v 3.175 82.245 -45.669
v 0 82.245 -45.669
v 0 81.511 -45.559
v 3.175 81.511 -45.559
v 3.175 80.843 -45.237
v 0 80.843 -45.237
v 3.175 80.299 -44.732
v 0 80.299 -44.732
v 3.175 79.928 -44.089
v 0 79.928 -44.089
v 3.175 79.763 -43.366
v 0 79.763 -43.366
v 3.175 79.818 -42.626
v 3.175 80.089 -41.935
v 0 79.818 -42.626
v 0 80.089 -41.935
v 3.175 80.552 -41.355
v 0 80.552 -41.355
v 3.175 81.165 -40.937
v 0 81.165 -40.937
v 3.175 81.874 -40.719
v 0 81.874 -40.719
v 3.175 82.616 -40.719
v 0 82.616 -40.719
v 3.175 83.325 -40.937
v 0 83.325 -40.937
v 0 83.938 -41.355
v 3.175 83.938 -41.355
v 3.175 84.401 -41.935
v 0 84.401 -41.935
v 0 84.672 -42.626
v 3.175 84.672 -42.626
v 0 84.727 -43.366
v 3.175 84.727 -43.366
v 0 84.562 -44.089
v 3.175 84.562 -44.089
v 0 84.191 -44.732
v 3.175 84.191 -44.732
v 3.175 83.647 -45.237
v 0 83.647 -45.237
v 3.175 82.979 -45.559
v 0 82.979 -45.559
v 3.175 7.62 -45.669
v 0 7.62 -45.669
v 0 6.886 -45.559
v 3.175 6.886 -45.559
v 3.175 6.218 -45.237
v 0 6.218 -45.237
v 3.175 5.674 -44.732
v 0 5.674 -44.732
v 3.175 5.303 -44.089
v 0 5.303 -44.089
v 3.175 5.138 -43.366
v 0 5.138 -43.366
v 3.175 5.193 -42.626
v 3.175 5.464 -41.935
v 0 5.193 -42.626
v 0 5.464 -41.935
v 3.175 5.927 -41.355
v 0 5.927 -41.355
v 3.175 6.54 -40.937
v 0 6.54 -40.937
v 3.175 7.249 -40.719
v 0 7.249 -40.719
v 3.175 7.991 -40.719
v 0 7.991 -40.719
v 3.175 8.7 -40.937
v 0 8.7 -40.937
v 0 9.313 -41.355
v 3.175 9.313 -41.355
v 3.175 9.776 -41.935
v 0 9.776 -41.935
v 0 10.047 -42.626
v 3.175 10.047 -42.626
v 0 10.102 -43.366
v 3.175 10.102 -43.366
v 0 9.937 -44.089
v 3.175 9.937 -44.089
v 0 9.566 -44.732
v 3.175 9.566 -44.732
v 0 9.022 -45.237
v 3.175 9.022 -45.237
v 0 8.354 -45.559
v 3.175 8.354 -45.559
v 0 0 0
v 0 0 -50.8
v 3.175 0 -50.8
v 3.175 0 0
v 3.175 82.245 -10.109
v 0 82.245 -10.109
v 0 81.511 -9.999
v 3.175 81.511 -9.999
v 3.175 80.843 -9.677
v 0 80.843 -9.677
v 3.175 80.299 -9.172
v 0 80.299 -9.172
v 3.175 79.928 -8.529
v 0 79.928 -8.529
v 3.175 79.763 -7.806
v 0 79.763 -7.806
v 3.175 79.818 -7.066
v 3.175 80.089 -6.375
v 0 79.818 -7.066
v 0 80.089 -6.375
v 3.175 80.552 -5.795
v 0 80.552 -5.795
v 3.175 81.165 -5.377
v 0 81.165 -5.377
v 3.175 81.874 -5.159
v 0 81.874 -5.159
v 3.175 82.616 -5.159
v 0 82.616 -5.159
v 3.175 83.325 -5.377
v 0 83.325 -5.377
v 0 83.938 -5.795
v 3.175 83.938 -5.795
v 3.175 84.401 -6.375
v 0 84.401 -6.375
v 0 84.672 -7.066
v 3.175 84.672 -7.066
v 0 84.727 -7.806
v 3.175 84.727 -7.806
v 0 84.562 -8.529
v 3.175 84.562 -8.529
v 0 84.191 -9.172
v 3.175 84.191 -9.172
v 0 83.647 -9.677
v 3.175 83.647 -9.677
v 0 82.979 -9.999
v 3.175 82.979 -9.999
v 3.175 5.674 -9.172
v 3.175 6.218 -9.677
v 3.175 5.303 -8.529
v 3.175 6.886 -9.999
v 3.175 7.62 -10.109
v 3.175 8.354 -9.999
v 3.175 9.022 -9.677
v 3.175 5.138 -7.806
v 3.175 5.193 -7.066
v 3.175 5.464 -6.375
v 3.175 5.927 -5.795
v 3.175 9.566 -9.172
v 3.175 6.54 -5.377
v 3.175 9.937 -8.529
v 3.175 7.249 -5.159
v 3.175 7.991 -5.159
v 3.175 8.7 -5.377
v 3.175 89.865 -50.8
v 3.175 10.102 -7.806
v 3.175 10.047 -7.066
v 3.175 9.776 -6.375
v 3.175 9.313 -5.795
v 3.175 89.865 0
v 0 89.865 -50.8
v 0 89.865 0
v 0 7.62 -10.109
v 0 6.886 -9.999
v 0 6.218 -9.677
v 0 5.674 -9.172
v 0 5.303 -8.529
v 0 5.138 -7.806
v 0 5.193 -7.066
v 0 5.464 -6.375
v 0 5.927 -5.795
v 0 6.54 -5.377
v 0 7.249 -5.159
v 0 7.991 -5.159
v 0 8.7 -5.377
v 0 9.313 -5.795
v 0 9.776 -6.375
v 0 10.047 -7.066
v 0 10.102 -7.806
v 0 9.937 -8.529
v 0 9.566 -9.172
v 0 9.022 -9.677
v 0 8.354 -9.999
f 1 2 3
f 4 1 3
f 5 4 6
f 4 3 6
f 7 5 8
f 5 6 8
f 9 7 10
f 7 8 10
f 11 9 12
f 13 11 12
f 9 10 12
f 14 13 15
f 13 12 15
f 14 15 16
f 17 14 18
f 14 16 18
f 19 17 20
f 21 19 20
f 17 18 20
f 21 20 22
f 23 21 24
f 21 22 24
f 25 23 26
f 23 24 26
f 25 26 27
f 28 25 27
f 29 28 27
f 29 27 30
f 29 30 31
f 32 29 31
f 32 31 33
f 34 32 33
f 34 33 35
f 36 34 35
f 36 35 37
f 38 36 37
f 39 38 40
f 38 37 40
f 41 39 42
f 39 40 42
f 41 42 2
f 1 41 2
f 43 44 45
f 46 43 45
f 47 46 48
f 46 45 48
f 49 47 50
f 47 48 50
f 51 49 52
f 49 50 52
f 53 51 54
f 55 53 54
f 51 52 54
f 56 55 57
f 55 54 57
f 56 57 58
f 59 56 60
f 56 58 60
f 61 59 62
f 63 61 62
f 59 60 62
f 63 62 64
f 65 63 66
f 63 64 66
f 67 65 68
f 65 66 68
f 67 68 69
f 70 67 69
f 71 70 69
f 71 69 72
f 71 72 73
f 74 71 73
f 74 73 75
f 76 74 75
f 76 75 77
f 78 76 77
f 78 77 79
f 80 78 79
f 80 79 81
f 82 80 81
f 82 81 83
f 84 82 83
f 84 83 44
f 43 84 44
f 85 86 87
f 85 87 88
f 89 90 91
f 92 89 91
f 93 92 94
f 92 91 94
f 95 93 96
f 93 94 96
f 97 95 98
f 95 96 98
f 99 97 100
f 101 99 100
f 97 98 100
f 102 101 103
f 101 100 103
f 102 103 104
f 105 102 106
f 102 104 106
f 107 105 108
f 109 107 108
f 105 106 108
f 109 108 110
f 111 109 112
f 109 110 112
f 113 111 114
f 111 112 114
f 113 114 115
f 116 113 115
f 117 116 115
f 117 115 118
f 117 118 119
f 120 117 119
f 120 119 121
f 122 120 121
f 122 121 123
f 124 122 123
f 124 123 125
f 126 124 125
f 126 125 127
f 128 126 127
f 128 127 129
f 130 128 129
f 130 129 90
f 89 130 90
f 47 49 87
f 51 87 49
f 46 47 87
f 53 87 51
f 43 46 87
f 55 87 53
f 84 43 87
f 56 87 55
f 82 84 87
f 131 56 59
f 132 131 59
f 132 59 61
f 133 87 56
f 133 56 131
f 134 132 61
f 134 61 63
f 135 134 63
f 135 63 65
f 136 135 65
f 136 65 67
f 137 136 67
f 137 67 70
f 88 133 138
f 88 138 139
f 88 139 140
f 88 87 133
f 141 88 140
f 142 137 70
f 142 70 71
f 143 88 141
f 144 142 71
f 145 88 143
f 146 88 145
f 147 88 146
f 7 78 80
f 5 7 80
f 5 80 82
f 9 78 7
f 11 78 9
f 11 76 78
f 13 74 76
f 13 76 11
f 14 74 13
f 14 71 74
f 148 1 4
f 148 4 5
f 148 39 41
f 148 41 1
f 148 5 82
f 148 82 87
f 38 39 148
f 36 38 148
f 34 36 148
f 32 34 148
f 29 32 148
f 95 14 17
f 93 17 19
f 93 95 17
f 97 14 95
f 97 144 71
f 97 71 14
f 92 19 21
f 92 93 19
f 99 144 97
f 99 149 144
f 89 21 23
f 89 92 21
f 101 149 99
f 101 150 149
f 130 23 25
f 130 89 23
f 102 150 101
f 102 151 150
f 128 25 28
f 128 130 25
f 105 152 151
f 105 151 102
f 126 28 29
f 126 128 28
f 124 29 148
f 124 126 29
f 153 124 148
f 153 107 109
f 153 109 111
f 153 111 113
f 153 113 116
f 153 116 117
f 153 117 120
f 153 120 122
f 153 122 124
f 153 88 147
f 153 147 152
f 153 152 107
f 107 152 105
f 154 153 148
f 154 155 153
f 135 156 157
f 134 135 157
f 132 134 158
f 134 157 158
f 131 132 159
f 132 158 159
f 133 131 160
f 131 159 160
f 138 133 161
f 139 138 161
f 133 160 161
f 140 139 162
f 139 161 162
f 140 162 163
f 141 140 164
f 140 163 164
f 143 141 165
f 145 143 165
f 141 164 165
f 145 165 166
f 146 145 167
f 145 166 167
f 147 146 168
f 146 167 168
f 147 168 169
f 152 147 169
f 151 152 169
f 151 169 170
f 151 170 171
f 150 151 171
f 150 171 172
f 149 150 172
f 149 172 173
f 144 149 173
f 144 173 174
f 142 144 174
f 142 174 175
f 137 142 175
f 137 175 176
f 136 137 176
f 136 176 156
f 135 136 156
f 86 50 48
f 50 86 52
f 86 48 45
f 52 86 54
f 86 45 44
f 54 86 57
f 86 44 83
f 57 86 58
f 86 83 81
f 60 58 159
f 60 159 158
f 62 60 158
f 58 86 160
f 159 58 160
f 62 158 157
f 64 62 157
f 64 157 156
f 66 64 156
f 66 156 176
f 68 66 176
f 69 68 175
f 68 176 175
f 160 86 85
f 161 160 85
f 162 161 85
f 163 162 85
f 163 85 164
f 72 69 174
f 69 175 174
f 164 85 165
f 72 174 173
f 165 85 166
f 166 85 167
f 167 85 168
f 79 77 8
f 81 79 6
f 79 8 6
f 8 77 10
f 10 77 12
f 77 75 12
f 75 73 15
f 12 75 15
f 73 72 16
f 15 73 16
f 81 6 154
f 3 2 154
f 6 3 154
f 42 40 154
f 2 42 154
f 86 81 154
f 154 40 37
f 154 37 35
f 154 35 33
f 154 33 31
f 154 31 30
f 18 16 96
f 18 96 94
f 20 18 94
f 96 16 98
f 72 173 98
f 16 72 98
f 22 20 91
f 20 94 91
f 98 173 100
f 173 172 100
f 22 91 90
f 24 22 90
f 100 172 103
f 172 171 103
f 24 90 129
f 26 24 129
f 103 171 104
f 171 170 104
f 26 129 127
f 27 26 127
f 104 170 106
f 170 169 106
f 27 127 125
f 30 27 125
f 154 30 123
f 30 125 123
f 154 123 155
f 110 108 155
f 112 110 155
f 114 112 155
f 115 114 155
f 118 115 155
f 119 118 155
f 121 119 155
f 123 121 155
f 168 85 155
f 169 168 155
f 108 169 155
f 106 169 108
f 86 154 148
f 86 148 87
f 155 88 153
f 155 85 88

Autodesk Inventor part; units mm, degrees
ref_plane "YZ Plane" through (0, 0, 0) normal (1, 0, 0) x (0, 1, 0)
ref_plane "XZ Plane" through (0, 0, 0) normal (0, 1, 0) x (-1, 0, 0)
ref_plane "XY Plane" through (0, 0, 0) normal (0, 0, 1) x (1, 0, 0)
sketch "Sketch1" plane through (0, 0, 0) normal (1, 0, 0) x (0, 1, 0)
  line L0 (0, 0) -> (89.8652, 0)
  line L1 (89.8652, 0) -> (89.8652, -50.8)
  line L2 (89.8652, -50.8) -> (0, -50.8)
  line L3 (0, -50.8) -> (0, 0)
  dimension "d0" = 89.8652
  dimension "d1" = 50.8
extrude "Extrusion1" add sketch "Sketch1" along normal blind 3.175
sketch "Sketch2" plane through (3.175, 0, 0) normal (1, 0, 0) x (0, 0, -1)
  line L0 (0, 89.8652) -> (0, 0) projected
  line L1 (50.8, 89.8652) -> (0, 89.8652) projected
  point P0 (7.62, 82.2452)
  dimension "d4" = 7.62
  dimension "d5" = 7.62
hole "Hole1" at (3.175, 82.2452, -7.62) direction (-1, 0, 0) diameter 4.9784 end through all
pattern_linear "Rectangular Pattern1" count 2 spacing 74.6252 along (0, -1, 0) count 2 spacing 35.56 along (0, 0, -1) of "Hole1"
properties part number "arm to water block plate" material "Aluminum 6061"
